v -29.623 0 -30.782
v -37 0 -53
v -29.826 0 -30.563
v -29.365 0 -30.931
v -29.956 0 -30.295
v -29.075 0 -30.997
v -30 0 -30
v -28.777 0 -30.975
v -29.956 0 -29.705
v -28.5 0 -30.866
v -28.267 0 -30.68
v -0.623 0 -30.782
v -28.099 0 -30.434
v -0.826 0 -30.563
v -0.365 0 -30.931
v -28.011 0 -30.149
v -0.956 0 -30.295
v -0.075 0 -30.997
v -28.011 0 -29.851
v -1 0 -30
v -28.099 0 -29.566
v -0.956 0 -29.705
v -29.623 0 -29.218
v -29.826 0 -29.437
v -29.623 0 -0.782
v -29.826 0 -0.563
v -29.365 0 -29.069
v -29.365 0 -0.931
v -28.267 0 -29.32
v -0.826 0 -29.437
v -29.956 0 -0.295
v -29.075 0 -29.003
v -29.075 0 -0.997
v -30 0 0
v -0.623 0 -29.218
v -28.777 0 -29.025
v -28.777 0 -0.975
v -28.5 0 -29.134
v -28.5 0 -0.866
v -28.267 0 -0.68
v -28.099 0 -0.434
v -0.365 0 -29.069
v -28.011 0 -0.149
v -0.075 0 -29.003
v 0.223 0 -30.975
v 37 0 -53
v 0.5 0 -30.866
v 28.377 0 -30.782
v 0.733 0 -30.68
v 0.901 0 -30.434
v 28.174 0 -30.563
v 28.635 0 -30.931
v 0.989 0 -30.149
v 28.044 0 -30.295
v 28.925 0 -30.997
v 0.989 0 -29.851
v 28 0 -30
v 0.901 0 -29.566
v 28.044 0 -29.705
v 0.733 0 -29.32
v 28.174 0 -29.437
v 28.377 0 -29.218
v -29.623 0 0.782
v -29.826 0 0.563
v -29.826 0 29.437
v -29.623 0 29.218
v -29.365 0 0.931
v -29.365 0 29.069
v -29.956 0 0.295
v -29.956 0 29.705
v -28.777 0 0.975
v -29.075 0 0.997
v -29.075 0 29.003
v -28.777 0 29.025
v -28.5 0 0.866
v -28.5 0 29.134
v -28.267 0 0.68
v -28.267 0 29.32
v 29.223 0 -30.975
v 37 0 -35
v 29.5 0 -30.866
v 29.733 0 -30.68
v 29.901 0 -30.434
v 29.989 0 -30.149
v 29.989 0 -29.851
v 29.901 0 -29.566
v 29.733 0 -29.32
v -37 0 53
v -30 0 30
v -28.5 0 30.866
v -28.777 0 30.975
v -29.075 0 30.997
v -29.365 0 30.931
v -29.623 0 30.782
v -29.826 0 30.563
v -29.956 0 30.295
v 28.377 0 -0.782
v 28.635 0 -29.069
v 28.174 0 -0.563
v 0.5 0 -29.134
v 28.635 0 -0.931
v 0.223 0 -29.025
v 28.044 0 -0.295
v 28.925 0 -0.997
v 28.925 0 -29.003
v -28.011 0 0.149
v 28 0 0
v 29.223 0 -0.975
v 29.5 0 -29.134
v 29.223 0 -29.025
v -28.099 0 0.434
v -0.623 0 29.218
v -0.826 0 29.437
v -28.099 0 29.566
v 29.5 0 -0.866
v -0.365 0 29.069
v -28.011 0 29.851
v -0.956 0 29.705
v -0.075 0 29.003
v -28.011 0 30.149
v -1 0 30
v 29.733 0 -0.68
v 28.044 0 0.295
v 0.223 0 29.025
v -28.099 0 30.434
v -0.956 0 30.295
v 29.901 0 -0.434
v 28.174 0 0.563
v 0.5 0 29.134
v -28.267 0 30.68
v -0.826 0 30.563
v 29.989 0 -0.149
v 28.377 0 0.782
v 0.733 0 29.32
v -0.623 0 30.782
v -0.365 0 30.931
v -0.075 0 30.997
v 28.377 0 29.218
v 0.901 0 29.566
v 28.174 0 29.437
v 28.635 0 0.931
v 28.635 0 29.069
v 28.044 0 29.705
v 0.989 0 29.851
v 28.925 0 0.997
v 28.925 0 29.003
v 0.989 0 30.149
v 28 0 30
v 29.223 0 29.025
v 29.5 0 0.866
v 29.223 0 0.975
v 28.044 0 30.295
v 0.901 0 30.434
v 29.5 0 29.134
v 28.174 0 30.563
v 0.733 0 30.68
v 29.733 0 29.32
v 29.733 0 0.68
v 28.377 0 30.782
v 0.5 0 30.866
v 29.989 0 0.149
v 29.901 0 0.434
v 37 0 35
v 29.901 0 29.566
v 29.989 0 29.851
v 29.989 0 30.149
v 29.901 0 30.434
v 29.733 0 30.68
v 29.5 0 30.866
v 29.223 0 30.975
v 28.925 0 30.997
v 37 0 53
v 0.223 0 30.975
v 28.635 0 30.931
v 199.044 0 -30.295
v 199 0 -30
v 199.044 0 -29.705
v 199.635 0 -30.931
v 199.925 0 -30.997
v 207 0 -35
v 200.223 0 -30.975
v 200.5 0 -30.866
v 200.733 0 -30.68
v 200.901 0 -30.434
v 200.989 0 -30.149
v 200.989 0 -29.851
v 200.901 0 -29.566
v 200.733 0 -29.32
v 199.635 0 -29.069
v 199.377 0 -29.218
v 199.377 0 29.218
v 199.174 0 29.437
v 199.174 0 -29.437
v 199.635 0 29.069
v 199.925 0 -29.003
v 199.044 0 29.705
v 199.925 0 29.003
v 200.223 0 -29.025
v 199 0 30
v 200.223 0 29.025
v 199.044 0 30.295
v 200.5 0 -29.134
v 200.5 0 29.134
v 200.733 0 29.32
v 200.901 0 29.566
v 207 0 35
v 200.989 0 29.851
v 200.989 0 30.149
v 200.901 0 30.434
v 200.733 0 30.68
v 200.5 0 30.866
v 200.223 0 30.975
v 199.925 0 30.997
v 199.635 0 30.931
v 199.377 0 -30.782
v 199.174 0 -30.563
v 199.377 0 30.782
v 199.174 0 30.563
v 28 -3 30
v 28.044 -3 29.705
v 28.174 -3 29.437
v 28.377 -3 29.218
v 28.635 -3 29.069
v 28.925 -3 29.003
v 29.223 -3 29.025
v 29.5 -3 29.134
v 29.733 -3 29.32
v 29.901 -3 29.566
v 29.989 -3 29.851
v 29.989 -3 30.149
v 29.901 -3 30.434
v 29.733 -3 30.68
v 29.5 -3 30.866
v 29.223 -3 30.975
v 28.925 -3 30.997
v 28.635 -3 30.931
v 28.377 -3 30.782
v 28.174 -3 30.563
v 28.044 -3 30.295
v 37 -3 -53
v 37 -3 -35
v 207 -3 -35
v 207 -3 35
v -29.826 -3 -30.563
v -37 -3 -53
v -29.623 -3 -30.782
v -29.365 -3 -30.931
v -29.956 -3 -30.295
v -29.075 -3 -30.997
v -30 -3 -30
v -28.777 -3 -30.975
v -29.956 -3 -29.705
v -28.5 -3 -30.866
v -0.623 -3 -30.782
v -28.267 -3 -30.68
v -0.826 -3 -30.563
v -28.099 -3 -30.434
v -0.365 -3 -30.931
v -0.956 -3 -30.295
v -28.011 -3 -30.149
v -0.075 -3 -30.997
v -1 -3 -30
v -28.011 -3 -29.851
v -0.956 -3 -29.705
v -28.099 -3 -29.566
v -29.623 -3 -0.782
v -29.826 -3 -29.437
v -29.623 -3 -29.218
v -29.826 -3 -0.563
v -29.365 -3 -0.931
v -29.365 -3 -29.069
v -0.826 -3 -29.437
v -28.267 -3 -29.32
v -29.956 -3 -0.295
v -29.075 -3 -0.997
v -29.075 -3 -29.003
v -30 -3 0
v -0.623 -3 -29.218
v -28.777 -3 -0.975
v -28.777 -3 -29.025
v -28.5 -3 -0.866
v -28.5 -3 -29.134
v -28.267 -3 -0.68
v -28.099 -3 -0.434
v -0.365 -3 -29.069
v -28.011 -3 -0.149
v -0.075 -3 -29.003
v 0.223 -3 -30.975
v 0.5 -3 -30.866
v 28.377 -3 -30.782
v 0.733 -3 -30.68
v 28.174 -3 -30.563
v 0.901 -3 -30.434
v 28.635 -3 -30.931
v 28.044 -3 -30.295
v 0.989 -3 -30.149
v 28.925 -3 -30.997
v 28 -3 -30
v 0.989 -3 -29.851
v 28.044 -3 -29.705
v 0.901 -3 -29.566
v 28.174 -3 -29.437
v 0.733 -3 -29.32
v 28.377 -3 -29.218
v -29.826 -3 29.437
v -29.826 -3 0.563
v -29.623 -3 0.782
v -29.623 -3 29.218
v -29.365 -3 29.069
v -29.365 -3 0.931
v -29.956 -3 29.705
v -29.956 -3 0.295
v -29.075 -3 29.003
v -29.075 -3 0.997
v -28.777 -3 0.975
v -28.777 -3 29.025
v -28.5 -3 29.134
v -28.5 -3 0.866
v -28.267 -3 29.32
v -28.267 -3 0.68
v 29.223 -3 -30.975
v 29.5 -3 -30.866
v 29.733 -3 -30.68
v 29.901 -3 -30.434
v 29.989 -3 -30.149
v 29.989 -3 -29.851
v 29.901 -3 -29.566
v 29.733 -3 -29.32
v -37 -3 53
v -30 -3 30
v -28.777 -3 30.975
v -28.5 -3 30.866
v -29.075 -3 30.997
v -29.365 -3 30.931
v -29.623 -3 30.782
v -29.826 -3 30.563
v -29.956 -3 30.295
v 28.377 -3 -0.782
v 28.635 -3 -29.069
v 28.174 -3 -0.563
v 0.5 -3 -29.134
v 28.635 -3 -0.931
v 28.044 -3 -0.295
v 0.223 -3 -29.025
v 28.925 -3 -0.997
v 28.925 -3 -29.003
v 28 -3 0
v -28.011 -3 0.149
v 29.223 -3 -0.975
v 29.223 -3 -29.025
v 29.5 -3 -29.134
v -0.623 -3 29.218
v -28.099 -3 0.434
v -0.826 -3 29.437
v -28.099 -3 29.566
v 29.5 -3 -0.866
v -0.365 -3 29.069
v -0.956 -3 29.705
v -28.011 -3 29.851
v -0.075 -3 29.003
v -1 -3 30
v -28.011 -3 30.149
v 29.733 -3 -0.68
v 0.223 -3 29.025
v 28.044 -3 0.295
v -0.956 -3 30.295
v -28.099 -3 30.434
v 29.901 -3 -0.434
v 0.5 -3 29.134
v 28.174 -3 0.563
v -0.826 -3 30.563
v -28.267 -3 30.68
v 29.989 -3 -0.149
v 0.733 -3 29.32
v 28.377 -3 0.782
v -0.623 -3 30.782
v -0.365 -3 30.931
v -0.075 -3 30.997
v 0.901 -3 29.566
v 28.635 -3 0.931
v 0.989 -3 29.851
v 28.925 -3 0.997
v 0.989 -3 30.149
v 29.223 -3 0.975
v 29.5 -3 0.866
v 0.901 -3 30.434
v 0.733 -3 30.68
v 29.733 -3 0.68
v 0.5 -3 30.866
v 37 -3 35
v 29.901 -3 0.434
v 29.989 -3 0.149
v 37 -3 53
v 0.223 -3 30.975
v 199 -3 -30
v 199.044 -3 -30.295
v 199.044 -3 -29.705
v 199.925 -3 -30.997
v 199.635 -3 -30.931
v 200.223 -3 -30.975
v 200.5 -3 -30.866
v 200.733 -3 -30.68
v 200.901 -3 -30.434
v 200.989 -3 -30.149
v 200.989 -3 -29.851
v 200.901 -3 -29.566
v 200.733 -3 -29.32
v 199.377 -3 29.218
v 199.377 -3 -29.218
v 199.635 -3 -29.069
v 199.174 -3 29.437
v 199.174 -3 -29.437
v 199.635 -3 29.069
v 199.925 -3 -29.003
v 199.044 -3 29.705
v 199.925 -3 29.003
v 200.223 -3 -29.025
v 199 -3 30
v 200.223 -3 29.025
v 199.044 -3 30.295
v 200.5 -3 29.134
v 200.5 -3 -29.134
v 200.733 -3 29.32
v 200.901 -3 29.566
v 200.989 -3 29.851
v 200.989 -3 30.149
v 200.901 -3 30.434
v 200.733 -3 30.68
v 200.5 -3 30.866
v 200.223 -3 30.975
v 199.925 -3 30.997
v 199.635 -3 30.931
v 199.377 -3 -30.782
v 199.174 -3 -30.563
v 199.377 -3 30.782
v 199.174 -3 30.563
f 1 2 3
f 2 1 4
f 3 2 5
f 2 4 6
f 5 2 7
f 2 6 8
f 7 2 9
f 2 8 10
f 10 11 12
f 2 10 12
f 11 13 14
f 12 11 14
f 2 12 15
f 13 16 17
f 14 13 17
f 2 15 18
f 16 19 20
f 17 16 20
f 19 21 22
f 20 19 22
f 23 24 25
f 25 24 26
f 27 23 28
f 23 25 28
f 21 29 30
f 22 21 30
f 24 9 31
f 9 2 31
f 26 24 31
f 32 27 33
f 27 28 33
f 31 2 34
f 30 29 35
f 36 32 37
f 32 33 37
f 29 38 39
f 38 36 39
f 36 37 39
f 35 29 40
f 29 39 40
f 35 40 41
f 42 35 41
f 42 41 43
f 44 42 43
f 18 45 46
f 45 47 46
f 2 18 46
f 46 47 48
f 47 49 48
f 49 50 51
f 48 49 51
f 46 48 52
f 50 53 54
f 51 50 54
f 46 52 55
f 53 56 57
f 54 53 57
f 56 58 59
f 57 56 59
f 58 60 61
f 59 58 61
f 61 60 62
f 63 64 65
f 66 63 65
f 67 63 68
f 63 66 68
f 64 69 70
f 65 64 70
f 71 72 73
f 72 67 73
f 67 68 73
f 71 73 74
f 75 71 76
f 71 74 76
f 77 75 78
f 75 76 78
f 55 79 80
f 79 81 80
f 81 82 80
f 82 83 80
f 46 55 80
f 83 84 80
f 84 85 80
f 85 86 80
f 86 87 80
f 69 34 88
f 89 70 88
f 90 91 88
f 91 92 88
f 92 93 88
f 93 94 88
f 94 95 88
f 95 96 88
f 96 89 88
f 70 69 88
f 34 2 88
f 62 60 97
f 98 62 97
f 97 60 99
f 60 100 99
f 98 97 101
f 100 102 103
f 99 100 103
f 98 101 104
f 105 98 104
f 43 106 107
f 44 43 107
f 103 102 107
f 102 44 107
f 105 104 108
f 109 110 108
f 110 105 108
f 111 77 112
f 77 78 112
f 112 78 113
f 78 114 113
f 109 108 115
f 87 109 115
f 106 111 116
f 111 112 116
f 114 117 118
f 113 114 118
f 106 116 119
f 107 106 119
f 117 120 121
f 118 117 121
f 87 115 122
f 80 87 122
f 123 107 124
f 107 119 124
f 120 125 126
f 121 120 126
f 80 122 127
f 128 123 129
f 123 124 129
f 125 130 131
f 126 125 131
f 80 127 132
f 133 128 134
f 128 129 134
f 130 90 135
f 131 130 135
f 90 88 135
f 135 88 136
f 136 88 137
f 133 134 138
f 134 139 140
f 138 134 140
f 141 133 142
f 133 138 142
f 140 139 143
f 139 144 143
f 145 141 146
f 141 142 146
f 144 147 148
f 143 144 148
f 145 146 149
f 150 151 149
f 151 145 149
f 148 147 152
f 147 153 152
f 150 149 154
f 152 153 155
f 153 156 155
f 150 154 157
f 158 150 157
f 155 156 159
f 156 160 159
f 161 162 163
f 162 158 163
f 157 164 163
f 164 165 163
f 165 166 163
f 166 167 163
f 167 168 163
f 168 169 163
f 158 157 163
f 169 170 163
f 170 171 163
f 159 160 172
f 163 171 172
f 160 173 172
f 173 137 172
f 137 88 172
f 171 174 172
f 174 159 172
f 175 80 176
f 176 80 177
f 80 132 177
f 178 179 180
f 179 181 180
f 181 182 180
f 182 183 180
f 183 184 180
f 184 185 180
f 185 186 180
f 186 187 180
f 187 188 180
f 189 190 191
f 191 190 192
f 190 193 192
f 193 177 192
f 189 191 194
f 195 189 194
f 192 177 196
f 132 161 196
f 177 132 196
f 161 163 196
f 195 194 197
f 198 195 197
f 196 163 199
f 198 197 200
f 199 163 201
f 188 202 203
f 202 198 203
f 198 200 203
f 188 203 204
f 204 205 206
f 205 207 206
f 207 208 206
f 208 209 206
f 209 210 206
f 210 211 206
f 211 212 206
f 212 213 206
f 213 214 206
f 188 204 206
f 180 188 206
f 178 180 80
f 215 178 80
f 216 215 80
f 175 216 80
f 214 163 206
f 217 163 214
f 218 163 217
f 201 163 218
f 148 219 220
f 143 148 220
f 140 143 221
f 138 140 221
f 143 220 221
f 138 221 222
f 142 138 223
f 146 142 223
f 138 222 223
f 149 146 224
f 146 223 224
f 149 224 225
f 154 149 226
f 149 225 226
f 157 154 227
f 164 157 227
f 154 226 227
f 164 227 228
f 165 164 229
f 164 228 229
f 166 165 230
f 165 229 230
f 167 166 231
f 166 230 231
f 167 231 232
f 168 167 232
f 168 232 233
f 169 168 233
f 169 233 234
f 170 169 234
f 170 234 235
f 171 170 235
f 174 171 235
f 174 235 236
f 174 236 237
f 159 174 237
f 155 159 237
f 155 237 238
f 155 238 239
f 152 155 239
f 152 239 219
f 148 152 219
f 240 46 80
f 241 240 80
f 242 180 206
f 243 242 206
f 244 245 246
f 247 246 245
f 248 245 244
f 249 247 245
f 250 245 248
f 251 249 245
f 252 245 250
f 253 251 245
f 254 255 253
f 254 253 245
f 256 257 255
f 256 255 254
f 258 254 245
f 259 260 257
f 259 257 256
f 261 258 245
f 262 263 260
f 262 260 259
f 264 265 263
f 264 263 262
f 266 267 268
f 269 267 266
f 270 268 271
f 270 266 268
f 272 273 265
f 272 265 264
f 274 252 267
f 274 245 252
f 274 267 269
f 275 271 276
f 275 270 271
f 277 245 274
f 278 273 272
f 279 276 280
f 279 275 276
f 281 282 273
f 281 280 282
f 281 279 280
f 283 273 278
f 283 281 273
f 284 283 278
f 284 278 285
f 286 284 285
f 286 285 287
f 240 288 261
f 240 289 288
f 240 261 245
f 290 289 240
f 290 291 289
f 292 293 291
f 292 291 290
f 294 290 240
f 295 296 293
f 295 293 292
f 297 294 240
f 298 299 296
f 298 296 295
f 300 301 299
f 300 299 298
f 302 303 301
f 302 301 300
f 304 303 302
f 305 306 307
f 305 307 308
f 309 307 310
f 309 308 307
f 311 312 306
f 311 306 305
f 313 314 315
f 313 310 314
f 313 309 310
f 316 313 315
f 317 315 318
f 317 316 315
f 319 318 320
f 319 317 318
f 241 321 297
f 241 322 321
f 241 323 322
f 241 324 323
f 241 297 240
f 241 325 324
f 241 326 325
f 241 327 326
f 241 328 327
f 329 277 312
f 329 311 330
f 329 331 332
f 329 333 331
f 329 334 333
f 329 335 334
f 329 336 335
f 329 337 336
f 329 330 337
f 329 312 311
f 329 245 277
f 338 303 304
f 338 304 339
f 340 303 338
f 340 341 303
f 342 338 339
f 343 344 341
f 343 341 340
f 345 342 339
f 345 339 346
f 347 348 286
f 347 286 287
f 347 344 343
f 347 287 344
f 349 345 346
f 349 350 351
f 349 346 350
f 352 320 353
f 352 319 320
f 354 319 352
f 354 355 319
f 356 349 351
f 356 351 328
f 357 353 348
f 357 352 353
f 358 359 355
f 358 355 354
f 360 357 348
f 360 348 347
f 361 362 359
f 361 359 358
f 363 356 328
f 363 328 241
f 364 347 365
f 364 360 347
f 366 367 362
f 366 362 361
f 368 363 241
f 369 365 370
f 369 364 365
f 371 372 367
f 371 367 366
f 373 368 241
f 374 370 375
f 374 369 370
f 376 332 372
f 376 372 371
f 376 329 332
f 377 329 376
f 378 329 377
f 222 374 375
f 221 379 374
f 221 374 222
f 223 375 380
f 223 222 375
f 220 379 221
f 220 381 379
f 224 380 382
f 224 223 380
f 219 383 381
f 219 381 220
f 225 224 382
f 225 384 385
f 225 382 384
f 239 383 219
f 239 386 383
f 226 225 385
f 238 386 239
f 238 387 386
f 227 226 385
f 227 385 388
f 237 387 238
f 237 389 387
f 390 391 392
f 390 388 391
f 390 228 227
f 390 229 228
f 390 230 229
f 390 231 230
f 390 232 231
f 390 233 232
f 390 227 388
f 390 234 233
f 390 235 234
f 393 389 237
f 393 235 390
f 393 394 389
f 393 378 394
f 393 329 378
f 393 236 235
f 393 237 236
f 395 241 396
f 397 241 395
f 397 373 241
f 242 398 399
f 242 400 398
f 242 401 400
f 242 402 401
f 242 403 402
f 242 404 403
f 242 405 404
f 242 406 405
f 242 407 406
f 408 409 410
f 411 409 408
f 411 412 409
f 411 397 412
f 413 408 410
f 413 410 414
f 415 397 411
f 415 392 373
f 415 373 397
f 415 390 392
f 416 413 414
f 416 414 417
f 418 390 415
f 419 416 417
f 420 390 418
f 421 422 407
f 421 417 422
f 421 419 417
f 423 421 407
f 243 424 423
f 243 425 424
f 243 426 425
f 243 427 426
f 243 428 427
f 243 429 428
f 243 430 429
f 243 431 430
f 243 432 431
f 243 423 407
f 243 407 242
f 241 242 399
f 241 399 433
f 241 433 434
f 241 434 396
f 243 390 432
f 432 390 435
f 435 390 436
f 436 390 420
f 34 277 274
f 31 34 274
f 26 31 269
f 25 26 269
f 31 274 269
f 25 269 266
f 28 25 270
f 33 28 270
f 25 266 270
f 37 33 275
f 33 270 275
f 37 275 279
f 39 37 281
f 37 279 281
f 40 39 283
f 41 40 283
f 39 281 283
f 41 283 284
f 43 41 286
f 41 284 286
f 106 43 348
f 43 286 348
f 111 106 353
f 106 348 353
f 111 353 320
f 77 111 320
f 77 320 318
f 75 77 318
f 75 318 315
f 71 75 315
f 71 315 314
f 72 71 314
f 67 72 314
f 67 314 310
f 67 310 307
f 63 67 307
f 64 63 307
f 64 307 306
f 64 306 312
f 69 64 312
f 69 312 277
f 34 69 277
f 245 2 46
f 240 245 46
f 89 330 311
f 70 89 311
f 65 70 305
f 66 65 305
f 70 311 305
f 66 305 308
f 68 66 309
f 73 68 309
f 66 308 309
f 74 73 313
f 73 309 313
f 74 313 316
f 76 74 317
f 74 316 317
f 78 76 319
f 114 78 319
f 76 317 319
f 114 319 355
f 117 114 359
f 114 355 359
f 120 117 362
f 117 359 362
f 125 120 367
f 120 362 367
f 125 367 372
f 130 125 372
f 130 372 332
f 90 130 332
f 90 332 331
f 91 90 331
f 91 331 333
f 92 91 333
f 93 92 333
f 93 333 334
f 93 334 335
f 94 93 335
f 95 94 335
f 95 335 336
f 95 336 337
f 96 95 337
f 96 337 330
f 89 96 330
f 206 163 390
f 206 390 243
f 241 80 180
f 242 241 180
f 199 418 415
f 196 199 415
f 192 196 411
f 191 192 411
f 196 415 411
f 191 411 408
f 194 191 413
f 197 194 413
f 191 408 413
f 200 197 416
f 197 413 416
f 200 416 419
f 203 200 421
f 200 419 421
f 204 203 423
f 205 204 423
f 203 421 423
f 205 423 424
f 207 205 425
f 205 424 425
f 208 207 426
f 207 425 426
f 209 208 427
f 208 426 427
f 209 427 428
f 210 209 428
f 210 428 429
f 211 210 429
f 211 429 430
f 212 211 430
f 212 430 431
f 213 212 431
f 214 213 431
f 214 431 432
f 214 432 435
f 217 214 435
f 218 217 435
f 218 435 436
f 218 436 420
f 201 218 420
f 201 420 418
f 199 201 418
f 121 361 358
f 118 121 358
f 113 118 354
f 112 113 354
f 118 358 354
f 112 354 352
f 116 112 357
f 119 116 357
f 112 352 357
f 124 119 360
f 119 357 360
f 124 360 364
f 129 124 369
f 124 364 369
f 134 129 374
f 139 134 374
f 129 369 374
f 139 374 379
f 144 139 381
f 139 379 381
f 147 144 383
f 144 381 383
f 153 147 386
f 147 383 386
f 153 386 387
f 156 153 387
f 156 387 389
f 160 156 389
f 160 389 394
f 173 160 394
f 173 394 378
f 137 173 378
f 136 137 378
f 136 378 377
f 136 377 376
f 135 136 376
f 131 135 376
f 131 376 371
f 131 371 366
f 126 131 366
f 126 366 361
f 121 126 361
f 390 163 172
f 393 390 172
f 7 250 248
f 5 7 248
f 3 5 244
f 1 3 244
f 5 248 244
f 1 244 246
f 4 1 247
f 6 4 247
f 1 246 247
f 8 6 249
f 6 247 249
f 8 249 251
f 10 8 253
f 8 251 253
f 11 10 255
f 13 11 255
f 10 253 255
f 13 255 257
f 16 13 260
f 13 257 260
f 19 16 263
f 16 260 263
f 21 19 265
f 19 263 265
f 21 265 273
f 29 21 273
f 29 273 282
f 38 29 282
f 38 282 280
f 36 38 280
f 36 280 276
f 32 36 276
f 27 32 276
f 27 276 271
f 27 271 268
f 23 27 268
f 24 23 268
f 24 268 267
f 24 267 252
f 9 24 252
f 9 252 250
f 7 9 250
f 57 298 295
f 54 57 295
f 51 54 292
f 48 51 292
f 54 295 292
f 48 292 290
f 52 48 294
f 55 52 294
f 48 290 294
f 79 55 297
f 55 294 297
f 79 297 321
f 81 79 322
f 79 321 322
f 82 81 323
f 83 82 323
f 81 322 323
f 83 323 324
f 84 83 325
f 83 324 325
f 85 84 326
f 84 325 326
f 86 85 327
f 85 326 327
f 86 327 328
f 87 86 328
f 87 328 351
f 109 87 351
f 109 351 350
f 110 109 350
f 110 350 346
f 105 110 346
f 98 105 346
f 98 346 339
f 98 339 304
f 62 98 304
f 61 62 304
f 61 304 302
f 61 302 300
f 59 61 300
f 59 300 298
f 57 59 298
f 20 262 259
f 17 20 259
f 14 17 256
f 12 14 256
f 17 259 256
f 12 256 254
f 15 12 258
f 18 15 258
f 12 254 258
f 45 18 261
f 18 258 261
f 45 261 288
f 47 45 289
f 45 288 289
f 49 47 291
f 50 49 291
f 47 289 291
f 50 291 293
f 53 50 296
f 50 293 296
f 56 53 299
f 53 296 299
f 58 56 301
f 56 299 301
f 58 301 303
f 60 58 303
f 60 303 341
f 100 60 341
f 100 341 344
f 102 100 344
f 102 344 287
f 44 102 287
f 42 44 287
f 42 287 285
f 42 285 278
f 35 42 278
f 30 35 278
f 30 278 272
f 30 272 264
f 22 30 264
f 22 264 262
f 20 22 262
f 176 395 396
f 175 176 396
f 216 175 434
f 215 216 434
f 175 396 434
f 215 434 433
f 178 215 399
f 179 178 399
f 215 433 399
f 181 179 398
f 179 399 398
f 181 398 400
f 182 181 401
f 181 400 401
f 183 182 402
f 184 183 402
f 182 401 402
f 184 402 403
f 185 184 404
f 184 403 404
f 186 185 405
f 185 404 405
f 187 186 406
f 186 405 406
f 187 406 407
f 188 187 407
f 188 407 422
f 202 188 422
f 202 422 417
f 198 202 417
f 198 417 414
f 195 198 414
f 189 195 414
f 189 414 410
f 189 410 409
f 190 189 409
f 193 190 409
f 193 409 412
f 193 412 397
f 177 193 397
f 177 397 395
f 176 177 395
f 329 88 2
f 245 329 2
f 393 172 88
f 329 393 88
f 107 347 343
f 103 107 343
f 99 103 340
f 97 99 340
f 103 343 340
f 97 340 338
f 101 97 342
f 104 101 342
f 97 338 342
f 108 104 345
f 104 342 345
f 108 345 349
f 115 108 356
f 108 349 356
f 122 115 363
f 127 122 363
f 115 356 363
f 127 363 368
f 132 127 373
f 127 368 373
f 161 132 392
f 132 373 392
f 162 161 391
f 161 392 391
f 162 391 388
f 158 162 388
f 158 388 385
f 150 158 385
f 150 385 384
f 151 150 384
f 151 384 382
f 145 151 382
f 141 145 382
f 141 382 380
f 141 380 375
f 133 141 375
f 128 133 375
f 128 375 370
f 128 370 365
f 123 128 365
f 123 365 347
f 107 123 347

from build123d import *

# Parameters (mm, degrees)
F0_W     = 170
F0_H     = 35
F1_DEPTH = 3
F2_D     = 2
F2_DEPTH = 40
F3_D     = 2
F3_DEPTH = 40
F5_D     = 2
F5_DEPTH = 40


with BuildPart() as f1:
    # F0 (on Front) → F1 (new body)
    with BuildSketch(Plane.XZ):
        Polygon((37, 35), (37, 53), (-37, 53), (-37, -53), (37, -53), (37, -35), (37, 0), align=None)
        with Locations((122, -17.5)):
            Rectangle(F0_W, F0_H)
        with Locations((122, 17.5)):
            Rectangle(F0_W, F0_H)
    extrude(amount=F1_DEPTH)

    # F2
    with Locations(Plane(origin=(0, 0, 0), x_dir=(1, 0, 0), z_dir=(0, 1, 0))):
        with Locations((-29, 0), (29, 0)):
            Hole(F2_D / 2, depth=F2_DEPTH)

    # F3
    with Locations(Plane(origin=(0, 0, 0), x_dir=(1, 0, 0), z_dir=(0, 1, 0))):
        with Locations((29, -30), (-29, -30), (29, 30), (-29, 30)):
            Hole(F3_D / 2, depth=F3_DEPTH)

    # F5
    with Locations(Plane(origin=(0, 0, 0), x_dir=(1, 0, 0), z_dir=(0, 1, 0))):
        with Locations((0, -30), (0, 30), (200, -30), (200, 30)):
            Hole(F5_D / 2, depth=F5_DEPTH)


solid = f1.part
